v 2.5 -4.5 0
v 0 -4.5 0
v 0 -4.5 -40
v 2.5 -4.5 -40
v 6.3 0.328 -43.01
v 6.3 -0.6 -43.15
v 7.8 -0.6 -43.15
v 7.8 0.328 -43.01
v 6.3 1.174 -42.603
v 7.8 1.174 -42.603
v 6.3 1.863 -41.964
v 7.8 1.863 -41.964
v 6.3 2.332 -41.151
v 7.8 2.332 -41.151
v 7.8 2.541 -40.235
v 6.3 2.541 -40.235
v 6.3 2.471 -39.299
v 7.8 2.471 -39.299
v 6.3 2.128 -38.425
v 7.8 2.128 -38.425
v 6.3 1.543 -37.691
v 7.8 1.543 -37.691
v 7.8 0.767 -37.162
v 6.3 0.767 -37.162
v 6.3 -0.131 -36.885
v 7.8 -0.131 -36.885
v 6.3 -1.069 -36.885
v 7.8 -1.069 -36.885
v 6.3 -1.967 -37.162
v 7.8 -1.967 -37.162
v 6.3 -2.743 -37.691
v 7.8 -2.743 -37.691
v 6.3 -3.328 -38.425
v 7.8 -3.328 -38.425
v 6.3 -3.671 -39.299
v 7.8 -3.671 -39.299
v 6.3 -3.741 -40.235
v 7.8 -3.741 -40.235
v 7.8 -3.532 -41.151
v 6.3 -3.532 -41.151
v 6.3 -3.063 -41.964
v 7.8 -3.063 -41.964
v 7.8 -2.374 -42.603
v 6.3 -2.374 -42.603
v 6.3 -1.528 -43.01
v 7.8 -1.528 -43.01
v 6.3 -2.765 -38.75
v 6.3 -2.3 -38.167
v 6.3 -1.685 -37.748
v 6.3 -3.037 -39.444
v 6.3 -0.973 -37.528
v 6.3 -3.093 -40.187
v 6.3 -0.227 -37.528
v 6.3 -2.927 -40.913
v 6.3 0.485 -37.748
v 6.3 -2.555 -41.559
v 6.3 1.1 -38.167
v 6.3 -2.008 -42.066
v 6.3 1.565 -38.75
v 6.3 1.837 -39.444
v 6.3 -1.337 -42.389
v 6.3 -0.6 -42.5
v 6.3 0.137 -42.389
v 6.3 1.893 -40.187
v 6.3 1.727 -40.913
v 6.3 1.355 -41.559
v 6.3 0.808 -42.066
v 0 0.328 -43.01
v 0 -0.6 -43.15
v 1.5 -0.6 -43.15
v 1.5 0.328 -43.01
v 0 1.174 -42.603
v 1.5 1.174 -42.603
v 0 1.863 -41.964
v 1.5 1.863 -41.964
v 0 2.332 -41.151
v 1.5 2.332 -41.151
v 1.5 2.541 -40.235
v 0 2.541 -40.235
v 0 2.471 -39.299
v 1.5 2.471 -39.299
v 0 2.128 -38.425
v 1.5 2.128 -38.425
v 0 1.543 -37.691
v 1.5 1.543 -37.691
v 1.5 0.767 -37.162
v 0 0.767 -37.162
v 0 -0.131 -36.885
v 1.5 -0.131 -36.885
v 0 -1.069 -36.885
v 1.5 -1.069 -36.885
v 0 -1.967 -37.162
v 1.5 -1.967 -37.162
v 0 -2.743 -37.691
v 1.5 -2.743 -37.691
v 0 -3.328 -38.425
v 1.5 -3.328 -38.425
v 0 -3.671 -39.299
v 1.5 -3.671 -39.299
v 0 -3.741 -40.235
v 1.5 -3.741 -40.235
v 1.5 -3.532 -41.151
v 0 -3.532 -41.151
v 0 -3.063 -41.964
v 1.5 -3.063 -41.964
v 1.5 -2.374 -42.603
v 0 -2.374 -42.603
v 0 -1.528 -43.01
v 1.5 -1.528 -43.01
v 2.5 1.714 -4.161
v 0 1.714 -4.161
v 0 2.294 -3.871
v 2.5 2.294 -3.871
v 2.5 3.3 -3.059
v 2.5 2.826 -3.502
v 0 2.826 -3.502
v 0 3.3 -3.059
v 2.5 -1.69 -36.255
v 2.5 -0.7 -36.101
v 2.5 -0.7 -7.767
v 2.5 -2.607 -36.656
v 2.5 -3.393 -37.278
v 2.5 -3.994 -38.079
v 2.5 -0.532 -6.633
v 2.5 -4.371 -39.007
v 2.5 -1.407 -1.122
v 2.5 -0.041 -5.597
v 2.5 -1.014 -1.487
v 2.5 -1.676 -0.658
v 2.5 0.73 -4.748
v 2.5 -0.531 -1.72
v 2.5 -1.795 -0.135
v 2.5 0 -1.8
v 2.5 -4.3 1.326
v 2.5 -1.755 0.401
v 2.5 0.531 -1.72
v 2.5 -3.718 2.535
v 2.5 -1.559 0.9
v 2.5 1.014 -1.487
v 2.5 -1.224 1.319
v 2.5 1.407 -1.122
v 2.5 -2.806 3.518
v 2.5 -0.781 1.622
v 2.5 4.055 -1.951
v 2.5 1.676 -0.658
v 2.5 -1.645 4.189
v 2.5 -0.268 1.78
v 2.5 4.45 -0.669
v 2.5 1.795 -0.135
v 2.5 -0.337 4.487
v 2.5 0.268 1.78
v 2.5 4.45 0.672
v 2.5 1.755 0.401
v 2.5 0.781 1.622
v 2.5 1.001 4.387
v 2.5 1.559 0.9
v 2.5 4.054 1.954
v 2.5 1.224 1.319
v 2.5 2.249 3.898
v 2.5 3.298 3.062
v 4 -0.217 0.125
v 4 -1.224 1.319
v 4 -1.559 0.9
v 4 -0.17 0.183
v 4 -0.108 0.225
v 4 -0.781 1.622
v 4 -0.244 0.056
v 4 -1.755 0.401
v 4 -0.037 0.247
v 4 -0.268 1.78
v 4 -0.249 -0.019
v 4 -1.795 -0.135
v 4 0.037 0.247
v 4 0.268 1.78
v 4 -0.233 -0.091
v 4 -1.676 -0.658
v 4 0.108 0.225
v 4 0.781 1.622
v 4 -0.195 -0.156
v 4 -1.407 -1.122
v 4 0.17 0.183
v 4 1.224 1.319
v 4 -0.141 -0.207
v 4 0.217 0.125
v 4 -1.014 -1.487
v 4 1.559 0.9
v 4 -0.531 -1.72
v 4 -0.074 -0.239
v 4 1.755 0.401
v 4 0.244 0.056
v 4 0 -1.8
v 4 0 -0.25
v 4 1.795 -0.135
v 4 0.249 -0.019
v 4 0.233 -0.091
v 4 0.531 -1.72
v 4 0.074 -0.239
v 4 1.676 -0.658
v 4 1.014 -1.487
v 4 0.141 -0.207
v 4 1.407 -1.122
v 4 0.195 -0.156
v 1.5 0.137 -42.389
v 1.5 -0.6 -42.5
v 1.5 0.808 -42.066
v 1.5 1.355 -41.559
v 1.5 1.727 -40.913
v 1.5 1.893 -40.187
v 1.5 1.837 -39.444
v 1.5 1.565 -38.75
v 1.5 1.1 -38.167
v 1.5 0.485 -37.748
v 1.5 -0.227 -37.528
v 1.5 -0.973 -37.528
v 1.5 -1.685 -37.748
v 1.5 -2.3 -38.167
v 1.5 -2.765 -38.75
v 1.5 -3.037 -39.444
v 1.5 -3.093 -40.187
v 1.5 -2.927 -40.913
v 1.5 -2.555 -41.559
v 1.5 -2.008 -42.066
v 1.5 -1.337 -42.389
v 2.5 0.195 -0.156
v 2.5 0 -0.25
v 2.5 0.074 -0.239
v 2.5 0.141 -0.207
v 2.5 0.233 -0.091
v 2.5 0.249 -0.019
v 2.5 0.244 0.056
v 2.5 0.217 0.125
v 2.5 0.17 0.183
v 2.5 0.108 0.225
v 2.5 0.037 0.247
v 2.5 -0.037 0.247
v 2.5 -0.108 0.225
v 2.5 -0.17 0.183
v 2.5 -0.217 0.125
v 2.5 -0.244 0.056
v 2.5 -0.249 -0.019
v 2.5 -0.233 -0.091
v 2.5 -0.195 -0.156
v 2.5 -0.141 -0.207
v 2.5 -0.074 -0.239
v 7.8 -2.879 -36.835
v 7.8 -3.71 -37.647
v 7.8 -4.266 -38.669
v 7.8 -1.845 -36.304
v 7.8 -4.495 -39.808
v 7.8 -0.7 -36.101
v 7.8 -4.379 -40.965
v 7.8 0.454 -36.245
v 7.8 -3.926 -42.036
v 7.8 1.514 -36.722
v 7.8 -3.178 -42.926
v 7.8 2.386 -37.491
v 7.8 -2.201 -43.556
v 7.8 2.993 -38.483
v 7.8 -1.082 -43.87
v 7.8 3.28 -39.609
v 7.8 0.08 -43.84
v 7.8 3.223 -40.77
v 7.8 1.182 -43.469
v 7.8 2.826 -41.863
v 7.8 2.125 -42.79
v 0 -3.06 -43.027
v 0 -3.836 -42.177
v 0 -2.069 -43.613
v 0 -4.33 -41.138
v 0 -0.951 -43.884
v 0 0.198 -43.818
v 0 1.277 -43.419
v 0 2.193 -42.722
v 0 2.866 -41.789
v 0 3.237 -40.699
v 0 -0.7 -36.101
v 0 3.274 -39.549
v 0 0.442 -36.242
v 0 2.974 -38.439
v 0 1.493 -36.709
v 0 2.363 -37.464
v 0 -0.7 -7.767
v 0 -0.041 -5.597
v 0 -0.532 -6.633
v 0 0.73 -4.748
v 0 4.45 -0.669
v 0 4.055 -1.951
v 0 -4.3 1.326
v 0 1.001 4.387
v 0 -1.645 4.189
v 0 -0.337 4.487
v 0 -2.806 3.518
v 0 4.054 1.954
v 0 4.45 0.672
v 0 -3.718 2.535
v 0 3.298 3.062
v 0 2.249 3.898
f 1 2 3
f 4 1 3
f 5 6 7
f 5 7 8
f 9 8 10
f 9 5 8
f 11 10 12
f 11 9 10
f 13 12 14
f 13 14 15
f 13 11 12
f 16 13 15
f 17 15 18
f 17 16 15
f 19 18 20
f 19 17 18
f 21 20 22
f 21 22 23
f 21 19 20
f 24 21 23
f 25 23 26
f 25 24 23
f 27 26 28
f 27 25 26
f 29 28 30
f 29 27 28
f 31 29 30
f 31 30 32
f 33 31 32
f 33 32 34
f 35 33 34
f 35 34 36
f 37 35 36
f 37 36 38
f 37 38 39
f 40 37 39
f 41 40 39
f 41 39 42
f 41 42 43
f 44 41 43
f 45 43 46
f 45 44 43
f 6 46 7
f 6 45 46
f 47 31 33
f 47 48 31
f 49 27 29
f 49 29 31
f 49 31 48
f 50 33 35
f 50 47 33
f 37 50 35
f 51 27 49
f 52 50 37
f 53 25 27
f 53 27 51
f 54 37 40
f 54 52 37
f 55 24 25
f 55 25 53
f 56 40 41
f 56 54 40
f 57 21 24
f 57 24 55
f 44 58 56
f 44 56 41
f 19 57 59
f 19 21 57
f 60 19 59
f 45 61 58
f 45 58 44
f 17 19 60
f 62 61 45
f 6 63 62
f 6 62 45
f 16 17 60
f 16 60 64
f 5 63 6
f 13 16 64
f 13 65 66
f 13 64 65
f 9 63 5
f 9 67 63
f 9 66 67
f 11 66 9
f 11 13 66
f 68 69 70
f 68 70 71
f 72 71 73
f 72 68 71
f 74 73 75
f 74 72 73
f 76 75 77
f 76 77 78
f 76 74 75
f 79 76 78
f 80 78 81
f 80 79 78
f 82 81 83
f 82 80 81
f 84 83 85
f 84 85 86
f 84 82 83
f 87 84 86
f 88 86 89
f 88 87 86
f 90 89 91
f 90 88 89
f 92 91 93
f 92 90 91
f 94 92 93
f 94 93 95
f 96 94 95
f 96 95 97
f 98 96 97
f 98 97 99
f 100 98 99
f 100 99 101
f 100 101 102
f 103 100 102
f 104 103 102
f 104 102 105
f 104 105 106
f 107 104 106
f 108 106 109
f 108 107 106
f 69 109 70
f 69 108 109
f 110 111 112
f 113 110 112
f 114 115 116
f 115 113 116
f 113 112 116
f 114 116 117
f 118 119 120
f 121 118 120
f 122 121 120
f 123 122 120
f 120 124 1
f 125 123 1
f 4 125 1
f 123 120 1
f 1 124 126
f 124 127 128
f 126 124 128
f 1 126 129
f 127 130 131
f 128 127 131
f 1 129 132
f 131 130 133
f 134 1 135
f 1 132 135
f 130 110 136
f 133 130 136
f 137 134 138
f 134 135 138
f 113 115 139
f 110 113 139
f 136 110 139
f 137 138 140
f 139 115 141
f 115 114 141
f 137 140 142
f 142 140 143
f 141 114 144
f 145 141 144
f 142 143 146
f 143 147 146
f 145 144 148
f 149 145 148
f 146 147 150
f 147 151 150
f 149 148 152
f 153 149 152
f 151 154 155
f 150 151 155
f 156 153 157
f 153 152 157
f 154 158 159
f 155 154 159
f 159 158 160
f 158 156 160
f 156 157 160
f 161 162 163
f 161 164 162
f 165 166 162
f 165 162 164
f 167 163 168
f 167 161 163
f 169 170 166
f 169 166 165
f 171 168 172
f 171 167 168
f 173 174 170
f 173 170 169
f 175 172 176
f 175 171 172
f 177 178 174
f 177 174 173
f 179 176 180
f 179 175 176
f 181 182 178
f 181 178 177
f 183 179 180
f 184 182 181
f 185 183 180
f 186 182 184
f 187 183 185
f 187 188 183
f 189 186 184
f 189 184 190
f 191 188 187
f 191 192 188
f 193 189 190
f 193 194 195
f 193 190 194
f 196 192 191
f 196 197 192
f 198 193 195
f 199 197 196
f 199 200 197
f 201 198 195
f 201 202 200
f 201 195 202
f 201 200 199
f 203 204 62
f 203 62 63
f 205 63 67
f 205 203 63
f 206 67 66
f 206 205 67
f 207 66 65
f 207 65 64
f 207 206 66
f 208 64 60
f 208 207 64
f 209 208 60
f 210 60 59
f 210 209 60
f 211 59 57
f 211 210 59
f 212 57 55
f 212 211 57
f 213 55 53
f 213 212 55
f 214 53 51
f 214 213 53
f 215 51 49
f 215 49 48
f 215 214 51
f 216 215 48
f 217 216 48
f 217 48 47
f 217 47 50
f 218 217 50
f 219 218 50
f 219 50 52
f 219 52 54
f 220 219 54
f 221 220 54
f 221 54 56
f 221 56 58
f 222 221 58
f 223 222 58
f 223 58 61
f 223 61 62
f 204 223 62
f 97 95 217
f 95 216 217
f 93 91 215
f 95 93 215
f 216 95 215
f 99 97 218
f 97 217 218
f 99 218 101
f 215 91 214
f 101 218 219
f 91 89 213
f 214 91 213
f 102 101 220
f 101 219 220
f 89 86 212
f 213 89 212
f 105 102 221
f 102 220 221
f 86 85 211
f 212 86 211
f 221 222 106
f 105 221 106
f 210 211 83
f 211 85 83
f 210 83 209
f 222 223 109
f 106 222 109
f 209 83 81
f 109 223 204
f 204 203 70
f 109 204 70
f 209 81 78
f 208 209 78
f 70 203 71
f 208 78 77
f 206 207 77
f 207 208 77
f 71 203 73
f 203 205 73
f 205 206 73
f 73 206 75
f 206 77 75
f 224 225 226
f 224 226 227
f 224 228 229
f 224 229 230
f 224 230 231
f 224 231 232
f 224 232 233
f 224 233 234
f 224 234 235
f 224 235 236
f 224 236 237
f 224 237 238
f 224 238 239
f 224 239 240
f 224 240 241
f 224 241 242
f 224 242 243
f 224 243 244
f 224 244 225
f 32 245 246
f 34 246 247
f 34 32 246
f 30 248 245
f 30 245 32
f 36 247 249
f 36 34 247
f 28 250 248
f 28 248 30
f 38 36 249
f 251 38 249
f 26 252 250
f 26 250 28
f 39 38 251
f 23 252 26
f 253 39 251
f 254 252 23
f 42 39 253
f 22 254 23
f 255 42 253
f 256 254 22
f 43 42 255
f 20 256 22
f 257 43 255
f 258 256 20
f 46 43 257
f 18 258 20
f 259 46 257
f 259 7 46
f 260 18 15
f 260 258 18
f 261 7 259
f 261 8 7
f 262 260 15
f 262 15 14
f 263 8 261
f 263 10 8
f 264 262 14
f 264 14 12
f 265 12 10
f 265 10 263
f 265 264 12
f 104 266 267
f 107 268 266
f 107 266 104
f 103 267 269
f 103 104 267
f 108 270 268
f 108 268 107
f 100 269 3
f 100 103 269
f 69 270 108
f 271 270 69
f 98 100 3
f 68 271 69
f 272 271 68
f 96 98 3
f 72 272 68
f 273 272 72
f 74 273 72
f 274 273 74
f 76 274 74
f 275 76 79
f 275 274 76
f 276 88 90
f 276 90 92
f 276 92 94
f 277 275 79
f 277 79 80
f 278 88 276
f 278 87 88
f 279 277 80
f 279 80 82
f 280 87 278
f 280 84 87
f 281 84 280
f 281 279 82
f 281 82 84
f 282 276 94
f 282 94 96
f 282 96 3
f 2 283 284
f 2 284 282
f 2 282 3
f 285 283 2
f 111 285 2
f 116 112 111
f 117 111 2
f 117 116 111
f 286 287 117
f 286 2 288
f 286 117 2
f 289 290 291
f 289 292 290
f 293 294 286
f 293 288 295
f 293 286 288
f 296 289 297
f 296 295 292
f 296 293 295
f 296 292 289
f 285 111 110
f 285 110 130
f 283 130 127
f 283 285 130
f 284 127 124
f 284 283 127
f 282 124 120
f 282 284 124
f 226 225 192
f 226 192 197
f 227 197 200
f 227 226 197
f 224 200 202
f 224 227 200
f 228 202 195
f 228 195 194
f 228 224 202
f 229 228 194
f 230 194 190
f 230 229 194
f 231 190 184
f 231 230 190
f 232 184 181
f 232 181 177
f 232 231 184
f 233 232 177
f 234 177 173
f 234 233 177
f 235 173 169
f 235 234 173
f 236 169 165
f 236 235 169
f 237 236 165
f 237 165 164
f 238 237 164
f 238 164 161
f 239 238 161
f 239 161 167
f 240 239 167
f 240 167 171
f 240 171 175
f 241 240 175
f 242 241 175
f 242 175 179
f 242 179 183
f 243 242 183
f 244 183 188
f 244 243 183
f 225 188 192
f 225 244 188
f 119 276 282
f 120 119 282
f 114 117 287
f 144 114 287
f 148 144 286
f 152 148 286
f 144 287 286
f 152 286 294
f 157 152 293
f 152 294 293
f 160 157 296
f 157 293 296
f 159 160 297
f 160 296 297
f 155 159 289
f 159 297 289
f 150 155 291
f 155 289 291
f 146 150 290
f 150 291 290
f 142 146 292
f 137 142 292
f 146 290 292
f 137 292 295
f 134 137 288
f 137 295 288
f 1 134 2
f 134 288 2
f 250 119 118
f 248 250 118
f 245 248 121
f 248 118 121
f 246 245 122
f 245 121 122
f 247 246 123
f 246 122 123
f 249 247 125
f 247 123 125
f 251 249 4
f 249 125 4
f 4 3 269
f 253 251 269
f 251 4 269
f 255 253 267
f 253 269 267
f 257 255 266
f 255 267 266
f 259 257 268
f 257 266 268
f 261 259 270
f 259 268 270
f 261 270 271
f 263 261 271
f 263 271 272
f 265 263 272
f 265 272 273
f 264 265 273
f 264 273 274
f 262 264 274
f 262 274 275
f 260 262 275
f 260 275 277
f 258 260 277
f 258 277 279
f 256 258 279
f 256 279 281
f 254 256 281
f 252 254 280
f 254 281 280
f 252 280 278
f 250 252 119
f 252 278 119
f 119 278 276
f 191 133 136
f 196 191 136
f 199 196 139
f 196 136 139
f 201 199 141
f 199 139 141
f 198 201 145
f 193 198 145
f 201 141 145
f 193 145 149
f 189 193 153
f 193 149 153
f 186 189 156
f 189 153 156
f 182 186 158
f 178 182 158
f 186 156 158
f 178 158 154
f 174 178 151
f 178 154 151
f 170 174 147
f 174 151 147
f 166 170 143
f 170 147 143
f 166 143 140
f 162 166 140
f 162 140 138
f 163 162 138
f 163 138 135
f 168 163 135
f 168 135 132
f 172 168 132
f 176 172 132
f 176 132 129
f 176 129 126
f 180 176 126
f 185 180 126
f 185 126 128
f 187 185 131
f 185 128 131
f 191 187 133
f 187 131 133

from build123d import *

# Parameters (mm, degrees)
SKETCH_1_R               = 4.5
SKETCH_1_W               = 43.9
SKETCH_1_H               = 7.8
EXTRUDE_1_DEPTH          = 2.5
EXTRUDE_START            = 2.5
SKETCH_1_6_R             = 1.8
SKETCH_1_6_R_2           = 0.25
EXTRUDE_3_DEPTH          = 1.5
SKETCH_1_5_W             = 7.8
SKETCH_1_5_H             = 7.8
EXTRUDE_2_DEPTH          = 7.8
SKETCH_1_7_R             = 2.5
CUT_EXTRUDE_1_DEPTH      = 45.814060294
SKETCH_1_8_R             = 3.15
SKETCH_1_8_R_2           = 2.5
CUT_EXTRUDE_2_DEPTH      = 1.5
CUT_EXTRUDE_START        = 6.3
SKETCH_1_9_R             = 3.15
SKETCH_1_9_R_2           = 2.5
CUT_EXTRUDE_3_DEPTH      = 1.5
CUT_EXTRUDE_4_DEPTH      = 45.814060294
FILLET_1_R               = 3.9
CUT_EXTRUDE_5_DEPTH      = 51.552448012
CUT_EXTRUDE_5_DEPTH_BACK = 51.552448012
SKETCH_3_W               = 64.704037325
SKETCH_3_H               = 20.946447886


with BuildPart() as part:
    # 草图1 → 凸台-拉伸1 (new body)
    with BuildSketch(Plane(origin=(0, 0, 0), x_dir=(0, 0, -1), z_dir=(1, 0, 0))):
        Circle(SKETCH_1_R)
        with Locations((21.95, -0.6)):
            Rectangle(SKETCH_1_W, SKETCH_1_H)
    extrude(amount=EXTRUDE_1_DEPTH)

    # 草图1<6> → 凸台-拉伸3 (add)
    with BuildSketch(Plane(origin=(0, 0, 0), x_dir=(0, 0, -1), z_dir=(1, 0, 0)).offset(EXTRUDE_START)):
        Circle(SKETCH_1_6_R)
        Circle(SKETCH_1_6_R_2, mode=Mode.SUBTRACT)
    extrude(amount=EXTRUDE_3_DEPTH)

    # 草图1<5> → 凸台-拉伸2 (add)
    with BuildSketch(Plane(origin=(0, 0, 0), x_dir=(0, 0, -1), z_dir=(1, 0, 0))):
        with Locations((40, -0.6)):
            Rectangle(SKETCH_1_5_W, SKETCH_1_5_H)
    extrude(amount=EXTRUDE_2_DEPTH)

    # 草图1<7> → 切除-拉伸1 (cut, through all)
    with BuildSketch(Plane(origin=(0, 0, 0), x_dir=(0, 0, -1), z_dir=(1, 0, 0))):
        with Locations((40, -0.6)):
            Circle(SKETCH_1_7_R)
    extrude(amount=CUT_EXTRUDE_1_DEPTH, mode=Mode.SUBTRACT)

    # 草图1<8> → 切除-拉伸2 (cut)
    with BuildSketch(Plane(origin=(0, 0, 0), x_dir=(0, 0, -1), z_dir=(1, 0, 0))):
        with Locations((40, -0.6)):
            Circle(SKETCH_1_8_R)
        with Locations((40, -0.6)):
            Circle(SKETCH_1_8_R_2, mode=Mode.SUBTRACT)
    extrude(amount=CUT_EXTRUDE_2_DEPTH, mode=Mode.SUBTRACT)

    # 草图1<9> → 切除-拉伸3 (cut)
    with BuildSketch(Plane(origin=(0, 0, 0), x_dir=(0, 0, -1), z_dir=(1, 0, 0)).offset(CUT_EXTRUDE_START)):
        with Locations((40, -0.6)):
            Circle(SKETCH_1_9_R)
        with Locations((40, -0.6)):
            Circle(SKETCH_1_9_R_2, mode=Mode.SUBTRACT)
    extrude(amount=CUT_EXTRUDE_3_DEPTH, mode=Mode.SUBTRACT)

    # 草图2 → 切除-拉伸4 (cut, through all)
    with BuildSketch(Plane.ZY):
        Polygon((-4.5, 3.3), (-36.1, 3.3), (-36.1, -0.7), (-4.5, -0.7), (-4.5, 0), align=None)
        with BuildLine():
            Line((-3.059411708, 3.3), (-4.5, 3.3))
            Line((-4.5, 3.3), (-4.5, 0))
            ThreePointArc((-4.5, 0), (-4.124157653, 1.800367645), (-3.059411708, 3.3))
        make_face()
    extrude(amount=-CUT_EXTRUDE_4_DEPTH, mode=Mode.SUBTRACT)

    # 圆角1
    # the kernel refuses this fillet: 3.9 mm, written as the material it adds along each edge
    with BuildSketch(Plane(origin=(0, -0.7, -4.5), x_dir=(0, 0, -1), z_dir=(1, 0, 0))) as fillet_1_piece_1:
        with BuildLine():
            CenterArc((3.266595136, 3.9), FILLET_1_R, 202.392687805, 67.607312195)
            Line((-0.339324035, 2.414285714), (-0.699915952, 2.265714286))
            ThreePointArc((-0.699915952, 2.265714286), (-0.39, 0.7), (-0.39, 0))
            Line((-0.39, 0), (0, -0.39))
            Line((0, -0.39), (3.266595136, -0.39))
            Line((3.266595136, -0.39), (3.266595136, 0))
        make_face()
    extrude(amount=2.5)
    # the kernel refuses this fillet: 3.9 mm, written as the material it takes off along each edge
    with BuildSketch(Plane(origin=(-9.75, -4.5, -43.9), x_dir=(0, 1, 0), z_dir=(1, 0, 0))) as fillet_1_2_piece_1:
        with BuildLine():
            CenterArc((FILLET_1_R, FILLET_1_R), FILLET_1_R, 180, 90)
            Line((0, FILLET_1_R), (0, 0))
            Line((0, 0), (FILLET_1_R, 0))
        make_face()
    extrude(amount=27.3, mode=Mode.SUBTRACT)
    with BuildSketch(Plane(origin=(17.55, 3.3, -43.9), x_dir=(0, 0, 1), z_dir=(-1, 0, 0)), Plane(origin=(17.55, 3.3, -36.1), x_dir=(0, -1, 0), z_dir=(-1, 0, 0))) as fillet_1_2_piece_2:
        with BuildLine():
            CenterArc((FILLET_1_R, -FILLET_1_R), FILLET_1_R, 90, 90)
            Line((0, -FILLET_1_R), (0, 0))
            Line((0, 0), (FILLET_1_R, 0))
        make_face()
    extrude(amount=27.3, mode=Mode.SUBTRACT)
    with BuildSketch(Plane(origin=(-7.25, -4.5, -36.1), x_dir=(0, 1, 0), z_dir=(1, 0, 0))) as fillet_1_2_piece_3_section:
        with BuildLine():
            CenterArc((FILLET_1_R, -FILLET_1_R), FILLET_1_R, 90, 90)
            Line((0, -FILLET_1_R), (0, 0))
            Line((0, 0), (FILLET_1_R, 0))
        make_face()
    fillet_1_2_piece_3 = extrude(amount=24.8, mode=Mode.PRIVATE)
    fillet_1_2_piece_3 = split(fillet_1_2_piece_3, bisect_by=Plane(origin=(1.25, -0.7, -36.100384668), z_dir=(0, 1, 0)), keep=Keep.TOP, mode=Mode.PRIVATE)
    add(fillet_1_2_piece_3, mode=Mode.SUBTRACT)
    with BuildSketch(Plane(origin=(2.5, -4.5, -36.1), x_dir=(0, 1, 0), z_dir=(1, 0, 0))) as fillet_1_2_piece_4:
        with BuildLine():
            CenterArc((FILLET_1_R, -FILLET_1_R), FILLET_1_R, 90, 90)
            Line((0, -FILLET_1_R), (0, 0))
            Line((0, 0), (FILLET_1_R, 0))
        make_face()
    extrude(amount=15.05, mode=Mode.SUBTRACT)


with BuildPart() as body_2:
    # 镜向2: mirrored copy
    add(part.part.mirror(Plane.ZX.offset(-10)))

    # 草图3 → 切除-拉伸5 (cut, two sides: drawn at the far end of the back side and taken through both)
    with BuildSketch(Plane(origin=(2.5, 0, 0), x_dir=(0, 0, -1), z_dir=(1, 0, 0)).offset(-CUT_EXTRUDE_5_DEPTH_BACK)):
        with Locations((21.266459283, -20.282495136)):
            Rectangle(SKETCH_3_W, SKETCH_3_H)
    extrude(amount=CUT_EXTRUDE_5_DEPTH + CUT_EXTRUDE_5_DEPTH_BACK, mode=Mode.SUBTRACT)


solid = part.part
